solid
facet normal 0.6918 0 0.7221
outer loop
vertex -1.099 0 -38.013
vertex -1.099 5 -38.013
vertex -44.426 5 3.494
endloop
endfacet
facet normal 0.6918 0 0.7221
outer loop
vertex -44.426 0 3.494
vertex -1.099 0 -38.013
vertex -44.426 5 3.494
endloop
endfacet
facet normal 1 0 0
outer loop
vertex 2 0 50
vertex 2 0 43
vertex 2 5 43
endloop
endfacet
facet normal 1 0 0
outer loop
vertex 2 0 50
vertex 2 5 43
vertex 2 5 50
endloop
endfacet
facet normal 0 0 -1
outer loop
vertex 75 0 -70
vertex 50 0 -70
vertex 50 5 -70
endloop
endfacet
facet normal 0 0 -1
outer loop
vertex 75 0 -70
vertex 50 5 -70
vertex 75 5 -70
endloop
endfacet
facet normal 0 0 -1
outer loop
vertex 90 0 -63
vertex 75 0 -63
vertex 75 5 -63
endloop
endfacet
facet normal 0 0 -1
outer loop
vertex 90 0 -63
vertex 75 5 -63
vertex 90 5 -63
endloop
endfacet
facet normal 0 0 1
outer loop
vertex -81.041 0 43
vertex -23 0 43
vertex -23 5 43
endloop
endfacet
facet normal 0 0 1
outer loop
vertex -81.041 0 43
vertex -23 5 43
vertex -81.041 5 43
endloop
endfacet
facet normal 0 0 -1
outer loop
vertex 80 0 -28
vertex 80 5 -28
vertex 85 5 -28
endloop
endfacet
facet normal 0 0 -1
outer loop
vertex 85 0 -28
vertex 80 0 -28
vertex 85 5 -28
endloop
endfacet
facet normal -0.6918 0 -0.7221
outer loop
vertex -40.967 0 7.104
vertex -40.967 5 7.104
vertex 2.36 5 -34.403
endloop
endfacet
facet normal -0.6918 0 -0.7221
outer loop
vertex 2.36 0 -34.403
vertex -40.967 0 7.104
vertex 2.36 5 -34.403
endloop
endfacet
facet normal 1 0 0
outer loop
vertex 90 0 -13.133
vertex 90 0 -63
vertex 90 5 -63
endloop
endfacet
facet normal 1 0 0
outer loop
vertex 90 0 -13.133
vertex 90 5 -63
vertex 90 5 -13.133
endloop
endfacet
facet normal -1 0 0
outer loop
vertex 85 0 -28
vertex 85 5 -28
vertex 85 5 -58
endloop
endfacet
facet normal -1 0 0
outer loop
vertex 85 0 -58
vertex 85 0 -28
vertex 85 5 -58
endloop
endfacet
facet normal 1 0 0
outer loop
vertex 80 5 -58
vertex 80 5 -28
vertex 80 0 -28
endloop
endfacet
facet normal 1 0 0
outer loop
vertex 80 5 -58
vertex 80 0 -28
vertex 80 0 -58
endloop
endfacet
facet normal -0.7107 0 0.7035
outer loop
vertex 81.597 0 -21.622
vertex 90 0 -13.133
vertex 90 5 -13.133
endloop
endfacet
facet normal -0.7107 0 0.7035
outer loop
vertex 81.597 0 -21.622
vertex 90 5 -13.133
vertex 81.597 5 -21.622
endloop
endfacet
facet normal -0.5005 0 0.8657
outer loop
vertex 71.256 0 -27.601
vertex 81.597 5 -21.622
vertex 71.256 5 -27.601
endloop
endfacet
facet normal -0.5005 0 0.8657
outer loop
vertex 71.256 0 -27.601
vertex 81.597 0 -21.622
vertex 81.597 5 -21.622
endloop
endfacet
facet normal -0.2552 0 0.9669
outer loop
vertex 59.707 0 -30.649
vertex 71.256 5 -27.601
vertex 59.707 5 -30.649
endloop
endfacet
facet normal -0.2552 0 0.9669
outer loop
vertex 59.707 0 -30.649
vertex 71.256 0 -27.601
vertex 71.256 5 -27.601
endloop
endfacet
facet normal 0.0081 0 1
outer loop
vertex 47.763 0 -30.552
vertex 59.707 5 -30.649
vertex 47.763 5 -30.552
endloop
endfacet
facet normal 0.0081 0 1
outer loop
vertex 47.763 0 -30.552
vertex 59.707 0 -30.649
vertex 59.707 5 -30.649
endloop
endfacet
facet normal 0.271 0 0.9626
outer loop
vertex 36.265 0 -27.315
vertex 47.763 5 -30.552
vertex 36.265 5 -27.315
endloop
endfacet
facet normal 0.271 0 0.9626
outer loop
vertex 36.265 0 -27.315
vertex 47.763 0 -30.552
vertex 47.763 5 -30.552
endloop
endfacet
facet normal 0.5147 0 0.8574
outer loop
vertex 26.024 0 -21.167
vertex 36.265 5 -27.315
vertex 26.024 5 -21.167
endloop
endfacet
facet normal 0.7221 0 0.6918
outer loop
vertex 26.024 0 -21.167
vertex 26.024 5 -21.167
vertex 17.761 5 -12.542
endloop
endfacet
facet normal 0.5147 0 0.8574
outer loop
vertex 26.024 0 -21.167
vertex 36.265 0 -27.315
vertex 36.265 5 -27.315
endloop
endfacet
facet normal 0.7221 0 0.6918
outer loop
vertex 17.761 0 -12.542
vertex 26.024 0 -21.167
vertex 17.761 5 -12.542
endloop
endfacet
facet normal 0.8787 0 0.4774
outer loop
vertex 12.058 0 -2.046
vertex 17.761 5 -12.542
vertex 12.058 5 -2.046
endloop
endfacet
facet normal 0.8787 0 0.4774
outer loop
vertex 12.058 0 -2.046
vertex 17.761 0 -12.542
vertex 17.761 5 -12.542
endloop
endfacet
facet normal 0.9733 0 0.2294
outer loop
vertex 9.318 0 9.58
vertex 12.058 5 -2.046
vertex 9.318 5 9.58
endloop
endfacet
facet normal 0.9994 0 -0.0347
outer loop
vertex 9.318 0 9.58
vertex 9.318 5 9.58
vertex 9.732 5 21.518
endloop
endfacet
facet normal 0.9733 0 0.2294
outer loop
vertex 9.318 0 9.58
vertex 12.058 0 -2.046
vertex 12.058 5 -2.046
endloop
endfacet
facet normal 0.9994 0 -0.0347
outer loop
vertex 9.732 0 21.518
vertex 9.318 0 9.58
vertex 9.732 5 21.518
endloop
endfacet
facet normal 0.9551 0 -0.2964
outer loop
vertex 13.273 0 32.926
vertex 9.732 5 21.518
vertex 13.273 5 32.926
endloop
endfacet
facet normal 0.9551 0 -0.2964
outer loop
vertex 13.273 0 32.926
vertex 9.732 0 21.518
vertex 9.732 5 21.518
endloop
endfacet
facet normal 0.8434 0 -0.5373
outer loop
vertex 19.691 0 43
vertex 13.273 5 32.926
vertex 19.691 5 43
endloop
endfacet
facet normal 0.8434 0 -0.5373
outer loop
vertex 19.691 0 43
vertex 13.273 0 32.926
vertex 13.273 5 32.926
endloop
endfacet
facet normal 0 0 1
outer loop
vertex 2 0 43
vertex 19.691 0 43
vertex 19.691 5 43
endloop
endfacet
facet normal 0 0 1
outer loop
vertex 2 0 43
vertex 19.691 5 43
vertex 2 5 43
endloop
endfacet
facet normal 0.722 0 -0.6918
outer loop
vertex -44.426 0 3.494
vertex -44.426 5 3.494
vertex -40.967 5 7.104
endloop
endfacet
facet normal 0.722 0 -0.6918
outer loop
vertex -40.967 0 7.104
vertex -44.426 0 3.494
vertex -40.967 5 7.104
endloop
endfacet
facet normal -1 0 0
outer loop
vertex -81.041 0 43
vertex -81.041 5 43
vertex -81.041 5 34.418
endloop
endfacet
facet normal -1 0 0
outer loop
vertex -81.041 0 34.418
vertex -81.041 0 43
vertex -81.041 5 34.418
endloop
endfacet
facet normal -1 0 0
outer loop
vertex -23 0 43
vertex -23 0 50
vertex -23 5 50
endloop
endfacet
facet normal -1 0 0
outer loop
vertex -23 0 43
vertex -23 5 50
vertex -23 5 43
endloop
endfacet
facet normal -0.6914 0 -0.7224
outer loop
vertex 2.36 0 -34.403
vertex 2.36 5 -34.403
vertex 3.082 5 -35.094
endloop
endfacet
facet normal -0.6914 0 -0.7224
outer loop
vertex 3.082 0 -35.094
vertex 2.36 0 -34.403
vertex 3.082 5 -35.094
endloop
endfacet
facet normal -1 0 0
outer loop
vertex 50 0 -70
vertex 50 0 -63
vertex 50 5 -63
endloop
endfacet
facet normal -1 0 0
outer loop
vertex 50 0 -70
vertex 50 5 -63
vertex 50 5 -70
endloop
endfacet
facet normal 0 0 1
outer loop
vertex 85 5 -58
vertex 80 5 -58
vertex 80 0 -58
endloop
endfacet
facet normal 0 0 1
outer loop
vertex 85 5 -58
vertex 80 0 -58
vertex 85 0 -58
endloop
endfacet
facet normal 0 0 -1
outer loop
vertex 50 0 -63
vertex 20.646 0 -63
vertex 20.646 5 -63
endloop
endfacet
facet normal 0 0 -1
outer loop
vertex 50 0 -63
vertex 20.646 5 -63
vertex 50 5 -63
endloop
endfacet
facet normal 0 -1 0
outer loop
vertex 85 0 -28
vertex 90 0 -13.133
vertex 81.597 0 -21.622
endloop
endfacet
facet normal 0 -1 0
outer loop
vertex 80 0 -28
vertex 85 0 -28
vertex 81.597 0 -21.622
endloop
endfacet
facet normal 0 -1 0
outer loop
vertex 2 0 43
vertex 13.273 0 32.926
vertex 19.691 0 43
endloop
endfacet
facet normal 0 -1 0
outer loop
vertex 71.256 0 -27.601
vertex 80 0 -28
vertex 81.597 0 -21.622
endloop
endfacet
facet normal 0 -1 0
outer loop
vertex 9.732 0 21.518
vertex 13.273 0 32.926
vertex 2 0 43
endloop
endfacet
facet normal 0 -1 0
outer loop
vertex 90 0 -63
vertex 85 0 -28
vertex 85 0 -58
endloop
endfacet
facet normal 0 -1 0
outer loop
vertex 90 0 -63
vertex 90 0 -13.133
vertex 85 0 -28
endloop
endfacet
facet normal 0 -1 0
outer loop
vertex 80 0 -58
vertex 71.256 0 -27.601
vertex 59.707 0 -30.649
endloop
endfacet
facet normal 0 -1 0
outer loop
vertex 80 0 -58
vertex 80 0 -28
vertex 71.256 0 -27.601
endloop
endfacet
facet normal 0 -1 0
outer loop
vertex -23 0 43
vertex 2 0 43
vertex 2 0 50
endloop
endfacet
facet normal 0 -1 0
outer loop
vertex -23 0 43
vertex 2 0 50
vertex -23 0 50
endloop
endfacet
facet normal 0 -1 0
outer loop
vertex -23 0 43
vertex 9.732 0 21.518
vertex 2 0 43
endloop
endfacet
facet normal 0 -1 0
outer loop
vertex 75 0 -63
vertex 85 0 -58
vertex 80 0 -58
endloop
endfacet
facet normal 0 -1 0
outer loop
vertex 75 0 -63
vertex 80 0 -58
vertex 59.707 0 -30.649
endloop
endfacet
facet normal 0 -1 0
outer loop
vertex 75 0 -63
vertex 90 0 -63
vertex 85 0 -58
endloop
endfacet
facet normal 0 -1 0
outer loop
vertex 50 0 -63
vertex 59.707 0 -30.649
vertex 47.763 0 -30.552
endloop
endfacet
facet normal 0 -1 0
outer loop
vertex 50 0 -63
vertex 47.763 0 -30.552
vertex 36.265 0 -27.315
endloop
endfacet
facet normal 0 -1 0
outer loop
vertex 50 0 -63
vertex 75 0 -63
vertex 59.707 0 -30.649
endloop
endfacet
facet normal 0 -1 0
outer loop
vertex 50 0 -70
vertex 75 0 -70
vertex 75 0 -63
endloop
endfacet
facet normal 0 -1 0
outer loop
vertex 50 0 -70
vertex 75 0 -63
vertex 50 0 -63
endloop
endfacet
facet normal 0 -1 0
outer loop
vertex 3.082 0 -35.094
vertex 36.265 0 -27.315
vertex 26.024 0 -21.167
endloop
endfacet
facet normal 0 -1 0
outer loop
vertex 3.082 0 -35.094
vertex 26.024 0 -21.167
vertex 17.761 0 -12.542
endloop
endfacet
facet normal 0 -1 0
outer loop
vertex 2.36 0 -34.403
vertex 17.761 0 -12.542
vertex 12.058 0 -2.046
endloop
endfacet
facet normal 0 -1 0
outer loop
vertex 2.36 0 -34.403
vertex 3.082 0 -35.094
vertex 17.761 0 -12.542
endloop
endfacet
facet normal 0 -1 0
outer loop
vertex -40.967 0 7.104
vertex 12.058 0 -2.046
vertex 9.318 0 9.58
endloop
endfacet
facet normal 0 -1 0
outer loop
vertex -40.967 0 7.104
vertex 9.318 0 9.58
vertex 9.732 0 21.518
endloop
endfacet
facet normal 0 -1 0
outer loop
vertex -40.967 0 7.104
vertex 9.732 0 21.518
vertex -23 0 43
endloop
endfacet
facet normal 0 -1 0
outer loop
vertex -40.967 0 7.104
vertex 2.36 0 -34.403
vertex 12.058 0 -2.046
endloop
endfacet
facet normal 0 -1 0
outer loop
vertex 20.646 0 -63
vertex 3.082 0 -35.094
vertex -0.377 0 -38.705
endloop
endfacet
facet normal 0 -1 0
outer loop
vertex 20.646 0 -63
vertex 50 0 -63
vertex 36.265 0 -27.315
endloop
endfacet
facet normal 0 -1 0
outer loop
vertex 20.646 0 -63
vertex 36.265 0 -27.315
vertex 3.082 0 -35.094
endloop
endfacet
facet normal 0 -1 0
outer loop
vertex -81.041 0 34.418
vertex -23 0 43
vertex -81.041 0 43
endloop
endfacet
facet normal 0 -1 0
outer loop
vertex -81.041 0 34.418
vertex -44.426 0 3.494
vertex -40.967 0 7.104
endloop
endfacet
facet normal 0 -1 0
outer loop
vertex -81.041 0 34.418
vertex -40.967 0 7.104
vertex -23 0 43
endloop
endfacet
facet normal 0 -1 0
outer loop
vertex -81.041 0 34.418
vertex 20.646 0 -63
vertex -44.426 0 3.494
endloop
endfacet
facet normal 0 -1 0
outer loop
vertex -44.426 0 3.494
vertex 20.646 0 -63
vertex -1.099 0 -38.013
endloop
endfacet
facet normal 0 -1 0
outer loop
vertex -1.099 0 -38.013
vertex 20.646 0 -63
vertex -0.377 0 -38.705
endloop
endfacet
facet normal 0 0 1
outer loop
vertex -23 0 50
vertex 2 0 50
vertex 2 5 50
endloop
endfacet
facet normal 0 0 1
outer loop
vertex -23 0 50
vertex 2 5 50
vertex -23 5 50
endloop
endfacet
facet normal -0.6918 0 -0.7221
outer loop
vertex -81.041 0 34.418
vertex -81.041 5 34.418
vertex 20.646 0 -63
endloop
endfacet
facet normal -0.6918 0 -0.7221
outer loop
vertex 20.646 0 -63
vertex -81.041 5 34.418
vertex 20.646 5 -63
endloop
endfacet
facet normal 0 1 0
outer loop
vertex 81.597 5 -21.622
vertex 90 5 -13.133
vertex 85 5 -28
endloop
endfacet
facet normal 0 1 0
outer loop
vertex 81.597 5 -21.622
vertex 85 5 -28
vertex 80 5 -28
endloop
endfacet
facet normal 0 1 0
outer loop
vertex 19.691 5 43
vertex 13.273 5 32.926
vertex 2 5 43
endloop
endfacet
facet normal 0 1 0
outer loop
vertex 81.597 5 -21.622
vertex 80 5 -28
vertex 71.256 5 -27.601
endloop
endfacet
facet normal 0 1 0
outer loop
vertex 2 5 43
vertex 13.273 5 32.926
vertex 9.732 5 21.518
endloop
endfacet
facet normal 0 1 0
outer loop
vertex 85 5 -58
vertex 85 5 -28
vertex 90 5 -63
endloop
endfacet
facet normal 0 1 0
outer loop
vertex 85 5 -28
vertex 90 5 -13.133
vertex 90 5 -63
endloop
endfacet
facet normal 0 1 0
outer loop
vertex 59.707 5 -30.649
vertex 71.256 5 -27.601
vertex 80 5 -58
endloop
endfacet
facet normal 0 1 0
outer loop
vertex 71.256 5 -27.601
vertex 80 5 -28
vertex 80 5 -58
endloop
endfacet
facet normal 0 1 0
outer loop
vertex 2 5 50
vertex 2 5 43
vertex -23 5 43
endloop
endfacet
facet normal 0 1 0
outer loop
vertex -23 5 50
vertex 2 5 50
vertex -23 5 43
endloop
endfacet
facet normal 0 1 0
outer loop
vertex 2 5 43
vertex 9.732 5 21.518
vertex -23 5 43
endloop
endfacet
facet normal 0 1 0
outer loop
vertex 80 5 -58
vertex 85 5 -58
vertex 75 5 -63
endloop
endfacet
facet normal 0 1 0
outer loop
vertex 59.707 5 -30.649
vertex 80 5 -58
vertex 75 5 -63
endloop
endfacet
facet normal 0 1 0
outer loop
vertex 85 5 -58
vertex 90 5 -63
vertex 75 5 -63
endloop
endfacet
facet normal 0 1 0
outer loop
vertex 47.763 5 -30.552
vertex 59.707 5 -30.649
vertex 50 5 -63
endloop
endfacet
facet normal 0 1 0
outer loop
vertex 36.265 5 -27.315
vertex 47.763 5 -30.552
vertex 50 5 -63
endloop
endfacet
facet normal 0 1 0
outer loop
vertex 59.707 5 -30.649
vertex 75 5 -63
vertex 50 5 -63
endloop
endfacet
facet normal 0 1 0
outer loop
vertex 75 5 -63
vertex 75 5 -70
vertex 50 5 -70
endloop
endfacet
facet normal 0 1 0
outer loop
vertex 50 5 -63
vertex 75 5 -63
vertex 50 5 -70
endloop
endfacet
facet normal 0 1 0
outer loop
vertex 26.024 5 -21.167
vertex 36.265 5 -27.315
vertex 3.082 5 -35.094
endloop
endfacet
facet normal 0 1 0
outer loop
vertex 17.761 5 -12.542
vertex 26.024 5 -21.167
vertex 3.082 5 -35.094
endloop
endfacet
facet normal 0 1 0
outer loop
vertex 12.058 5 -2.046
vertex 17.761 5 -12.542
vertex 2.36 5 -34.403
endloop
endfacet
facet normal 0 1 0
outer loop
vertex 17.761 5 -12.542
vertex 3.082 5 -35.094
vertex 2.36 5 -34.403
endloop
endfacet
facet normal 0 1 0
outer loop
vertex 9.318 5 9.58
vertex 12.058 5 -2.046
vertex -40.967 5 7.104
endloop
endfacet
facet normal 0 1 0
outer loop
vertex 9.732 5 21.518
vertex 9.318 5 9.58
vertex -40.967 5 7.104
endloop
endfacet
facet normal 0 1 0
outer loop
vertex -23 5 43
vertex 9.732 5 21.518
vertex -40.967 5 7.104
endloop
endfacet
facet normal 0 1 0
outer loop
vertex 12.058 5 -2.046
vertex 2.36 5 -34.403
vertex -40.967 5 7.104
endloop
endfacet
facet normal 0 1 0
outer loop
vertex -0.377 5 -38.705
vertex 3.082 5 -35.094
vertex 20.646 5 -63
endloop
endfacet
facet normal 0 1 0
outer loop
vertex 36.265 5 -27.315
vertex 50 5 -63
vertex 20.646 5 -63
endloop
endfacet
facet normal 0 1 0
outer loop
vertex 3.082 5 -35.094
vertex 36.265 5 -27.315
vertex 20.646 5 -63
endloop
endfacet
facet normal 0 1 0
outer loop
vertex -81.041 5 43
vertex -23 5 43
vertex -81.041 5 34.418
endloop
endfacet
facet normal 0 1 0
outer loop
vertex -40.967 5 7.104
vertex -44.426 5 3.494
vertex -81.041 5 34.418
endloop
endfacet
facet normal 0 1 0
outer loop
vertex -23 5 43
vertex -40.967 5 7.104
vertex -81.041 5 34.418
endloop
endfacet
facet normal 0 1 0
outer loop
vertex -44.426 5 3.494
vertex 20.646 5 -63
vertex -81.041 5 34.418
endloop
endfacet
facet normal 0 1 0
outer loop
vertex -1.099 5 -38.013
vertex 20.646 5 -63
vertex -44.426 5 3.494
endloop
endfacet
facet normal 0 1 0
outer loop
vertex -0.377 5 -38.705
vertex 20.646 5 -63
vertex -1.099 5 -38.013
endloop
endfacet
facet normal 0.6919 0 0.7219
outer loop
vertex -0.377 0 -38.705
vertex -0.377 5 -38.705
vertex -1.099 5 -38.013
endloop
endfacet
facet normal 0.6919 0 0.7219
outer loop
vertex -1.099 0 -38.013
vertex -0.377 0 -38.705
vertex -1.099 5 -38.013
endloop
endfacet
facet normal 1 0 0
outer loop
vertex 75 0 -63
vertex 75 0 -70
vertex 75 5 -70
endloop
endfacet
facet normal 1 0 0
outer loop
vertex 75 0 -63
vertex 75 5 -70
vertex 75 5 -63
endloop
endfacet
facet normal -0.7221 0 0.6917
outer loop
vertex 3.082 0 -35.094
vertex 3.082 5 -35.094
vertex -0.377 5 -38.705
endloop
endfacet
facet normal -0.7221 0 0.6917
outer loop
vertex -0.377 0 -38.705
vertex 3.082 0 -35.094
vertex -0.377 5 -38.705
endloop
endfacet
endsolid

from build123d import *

# Parameters (mm, degrees)
BOSS_EXTRUDE1_DEPTH = 5
CUT_EXTRUDE1_DEPTH  = 6
CUT_EXTRUDE2_DEPTH  = 6
SKETCH6_W           = 5
SKETCH6_H           = 30
CUT_EXTRUDE4_DEPTH  = 6
CUT_EXTRUDE5_DEPTH  = 6


with BuildPart() as part:
    # Sketch1 → Boss-Extrude1 (new body)
    with BuildSketch(Plane(origin=(0, 0, 0), x_dir=(1, 0, 0), z_dir=(0, 1, 0))):
        with BuildLine():
            Line((-90, -43), (-90, 63))
            Line((-90, 63), (50, 63))
            Line((50, 63), (50, 70))
            Line((50, 70), (75, 70))
            Line((75, 70), (75, 63))
            Line((75, 63), (90, 63))
            Line((90, 63), (90, 13.132821453))
            ThreePointArc((90, 13.132821453), (26.02369403, 21.167044845), (19.690698932, -43))
            Line((19.690698932, -43), (2, -43))
            Line((2, -43), (2, -50))
            Line((2, -50), (-23, -50))
            Line((-23, -50), (-23, -43))
            Line((-23, -43), (-90, -43))
        make_face()
    extrude(amount=BOSS_EXTRUDE1_DEPTH)

    # Sketch2 → Cut-Extrude1 (cut, through all)
    with BuildSketch(Plane(origin=(0, 5, 0), x_dir=(1, 0, 0), z_dir=(0, 1, 0))):
        Polygon((-90, -43), (20.646102312, 63), (-90, 63), align=None)
    extrude(amount=-CUT_EXTRUDE1_DEPTH, mode=Mode.SUBTRACT)

    # Sketch4 → Cut-Extrude2 (cut, through all)
    with BuildSketch(Plane(origin=(0, 5, 0), x_dir=(1, 0, 0), z_dir=(0, 1, 0))):
        Polygon((-1.099353578, 38.01312996), (-44.425657525, -3.493874103), (-40.966740519, -7.104399432), (2.359563427, 34.402604632), (3.081668493, 35.094388033), (-0.377248513, 38.704913361), align=None)
    extrude(amount=-CUT_EXTRUDE2_DEPTH, mode=Mode.SUBTRACT)

    # Sketch6 → Cut-Extrude4 (cut, through all)
    with BuildSketch(Plane(origin=(0, 5, 0), x_dir=(1, 0, 0), z_dir=(0, 1, 0))):
        with Locations((82.5, 43)):
            Rectangle(SKETCH6_W, SKETCH6_H)
    extrude(amount=-CUT_EXTRUDE4_DEPTH, mode=Mode.SUBTRACT)

    # Sketch8 → Cut-Extrude5 (cut, through all)
    with BuildSketch(Plane(origin=(0, 5, 0), x_dir=(1, 0, 0), z_dir=(0, 1, 0))):
        Polygon((-81.041343938, -43), (-81.041343938, -34.417523775), (-90, -43), align=None)
    extrude(amount=-CUT_EXTRUDE5_DEPTH, mode=Mode.SUBTRACT)


solid = part.part
